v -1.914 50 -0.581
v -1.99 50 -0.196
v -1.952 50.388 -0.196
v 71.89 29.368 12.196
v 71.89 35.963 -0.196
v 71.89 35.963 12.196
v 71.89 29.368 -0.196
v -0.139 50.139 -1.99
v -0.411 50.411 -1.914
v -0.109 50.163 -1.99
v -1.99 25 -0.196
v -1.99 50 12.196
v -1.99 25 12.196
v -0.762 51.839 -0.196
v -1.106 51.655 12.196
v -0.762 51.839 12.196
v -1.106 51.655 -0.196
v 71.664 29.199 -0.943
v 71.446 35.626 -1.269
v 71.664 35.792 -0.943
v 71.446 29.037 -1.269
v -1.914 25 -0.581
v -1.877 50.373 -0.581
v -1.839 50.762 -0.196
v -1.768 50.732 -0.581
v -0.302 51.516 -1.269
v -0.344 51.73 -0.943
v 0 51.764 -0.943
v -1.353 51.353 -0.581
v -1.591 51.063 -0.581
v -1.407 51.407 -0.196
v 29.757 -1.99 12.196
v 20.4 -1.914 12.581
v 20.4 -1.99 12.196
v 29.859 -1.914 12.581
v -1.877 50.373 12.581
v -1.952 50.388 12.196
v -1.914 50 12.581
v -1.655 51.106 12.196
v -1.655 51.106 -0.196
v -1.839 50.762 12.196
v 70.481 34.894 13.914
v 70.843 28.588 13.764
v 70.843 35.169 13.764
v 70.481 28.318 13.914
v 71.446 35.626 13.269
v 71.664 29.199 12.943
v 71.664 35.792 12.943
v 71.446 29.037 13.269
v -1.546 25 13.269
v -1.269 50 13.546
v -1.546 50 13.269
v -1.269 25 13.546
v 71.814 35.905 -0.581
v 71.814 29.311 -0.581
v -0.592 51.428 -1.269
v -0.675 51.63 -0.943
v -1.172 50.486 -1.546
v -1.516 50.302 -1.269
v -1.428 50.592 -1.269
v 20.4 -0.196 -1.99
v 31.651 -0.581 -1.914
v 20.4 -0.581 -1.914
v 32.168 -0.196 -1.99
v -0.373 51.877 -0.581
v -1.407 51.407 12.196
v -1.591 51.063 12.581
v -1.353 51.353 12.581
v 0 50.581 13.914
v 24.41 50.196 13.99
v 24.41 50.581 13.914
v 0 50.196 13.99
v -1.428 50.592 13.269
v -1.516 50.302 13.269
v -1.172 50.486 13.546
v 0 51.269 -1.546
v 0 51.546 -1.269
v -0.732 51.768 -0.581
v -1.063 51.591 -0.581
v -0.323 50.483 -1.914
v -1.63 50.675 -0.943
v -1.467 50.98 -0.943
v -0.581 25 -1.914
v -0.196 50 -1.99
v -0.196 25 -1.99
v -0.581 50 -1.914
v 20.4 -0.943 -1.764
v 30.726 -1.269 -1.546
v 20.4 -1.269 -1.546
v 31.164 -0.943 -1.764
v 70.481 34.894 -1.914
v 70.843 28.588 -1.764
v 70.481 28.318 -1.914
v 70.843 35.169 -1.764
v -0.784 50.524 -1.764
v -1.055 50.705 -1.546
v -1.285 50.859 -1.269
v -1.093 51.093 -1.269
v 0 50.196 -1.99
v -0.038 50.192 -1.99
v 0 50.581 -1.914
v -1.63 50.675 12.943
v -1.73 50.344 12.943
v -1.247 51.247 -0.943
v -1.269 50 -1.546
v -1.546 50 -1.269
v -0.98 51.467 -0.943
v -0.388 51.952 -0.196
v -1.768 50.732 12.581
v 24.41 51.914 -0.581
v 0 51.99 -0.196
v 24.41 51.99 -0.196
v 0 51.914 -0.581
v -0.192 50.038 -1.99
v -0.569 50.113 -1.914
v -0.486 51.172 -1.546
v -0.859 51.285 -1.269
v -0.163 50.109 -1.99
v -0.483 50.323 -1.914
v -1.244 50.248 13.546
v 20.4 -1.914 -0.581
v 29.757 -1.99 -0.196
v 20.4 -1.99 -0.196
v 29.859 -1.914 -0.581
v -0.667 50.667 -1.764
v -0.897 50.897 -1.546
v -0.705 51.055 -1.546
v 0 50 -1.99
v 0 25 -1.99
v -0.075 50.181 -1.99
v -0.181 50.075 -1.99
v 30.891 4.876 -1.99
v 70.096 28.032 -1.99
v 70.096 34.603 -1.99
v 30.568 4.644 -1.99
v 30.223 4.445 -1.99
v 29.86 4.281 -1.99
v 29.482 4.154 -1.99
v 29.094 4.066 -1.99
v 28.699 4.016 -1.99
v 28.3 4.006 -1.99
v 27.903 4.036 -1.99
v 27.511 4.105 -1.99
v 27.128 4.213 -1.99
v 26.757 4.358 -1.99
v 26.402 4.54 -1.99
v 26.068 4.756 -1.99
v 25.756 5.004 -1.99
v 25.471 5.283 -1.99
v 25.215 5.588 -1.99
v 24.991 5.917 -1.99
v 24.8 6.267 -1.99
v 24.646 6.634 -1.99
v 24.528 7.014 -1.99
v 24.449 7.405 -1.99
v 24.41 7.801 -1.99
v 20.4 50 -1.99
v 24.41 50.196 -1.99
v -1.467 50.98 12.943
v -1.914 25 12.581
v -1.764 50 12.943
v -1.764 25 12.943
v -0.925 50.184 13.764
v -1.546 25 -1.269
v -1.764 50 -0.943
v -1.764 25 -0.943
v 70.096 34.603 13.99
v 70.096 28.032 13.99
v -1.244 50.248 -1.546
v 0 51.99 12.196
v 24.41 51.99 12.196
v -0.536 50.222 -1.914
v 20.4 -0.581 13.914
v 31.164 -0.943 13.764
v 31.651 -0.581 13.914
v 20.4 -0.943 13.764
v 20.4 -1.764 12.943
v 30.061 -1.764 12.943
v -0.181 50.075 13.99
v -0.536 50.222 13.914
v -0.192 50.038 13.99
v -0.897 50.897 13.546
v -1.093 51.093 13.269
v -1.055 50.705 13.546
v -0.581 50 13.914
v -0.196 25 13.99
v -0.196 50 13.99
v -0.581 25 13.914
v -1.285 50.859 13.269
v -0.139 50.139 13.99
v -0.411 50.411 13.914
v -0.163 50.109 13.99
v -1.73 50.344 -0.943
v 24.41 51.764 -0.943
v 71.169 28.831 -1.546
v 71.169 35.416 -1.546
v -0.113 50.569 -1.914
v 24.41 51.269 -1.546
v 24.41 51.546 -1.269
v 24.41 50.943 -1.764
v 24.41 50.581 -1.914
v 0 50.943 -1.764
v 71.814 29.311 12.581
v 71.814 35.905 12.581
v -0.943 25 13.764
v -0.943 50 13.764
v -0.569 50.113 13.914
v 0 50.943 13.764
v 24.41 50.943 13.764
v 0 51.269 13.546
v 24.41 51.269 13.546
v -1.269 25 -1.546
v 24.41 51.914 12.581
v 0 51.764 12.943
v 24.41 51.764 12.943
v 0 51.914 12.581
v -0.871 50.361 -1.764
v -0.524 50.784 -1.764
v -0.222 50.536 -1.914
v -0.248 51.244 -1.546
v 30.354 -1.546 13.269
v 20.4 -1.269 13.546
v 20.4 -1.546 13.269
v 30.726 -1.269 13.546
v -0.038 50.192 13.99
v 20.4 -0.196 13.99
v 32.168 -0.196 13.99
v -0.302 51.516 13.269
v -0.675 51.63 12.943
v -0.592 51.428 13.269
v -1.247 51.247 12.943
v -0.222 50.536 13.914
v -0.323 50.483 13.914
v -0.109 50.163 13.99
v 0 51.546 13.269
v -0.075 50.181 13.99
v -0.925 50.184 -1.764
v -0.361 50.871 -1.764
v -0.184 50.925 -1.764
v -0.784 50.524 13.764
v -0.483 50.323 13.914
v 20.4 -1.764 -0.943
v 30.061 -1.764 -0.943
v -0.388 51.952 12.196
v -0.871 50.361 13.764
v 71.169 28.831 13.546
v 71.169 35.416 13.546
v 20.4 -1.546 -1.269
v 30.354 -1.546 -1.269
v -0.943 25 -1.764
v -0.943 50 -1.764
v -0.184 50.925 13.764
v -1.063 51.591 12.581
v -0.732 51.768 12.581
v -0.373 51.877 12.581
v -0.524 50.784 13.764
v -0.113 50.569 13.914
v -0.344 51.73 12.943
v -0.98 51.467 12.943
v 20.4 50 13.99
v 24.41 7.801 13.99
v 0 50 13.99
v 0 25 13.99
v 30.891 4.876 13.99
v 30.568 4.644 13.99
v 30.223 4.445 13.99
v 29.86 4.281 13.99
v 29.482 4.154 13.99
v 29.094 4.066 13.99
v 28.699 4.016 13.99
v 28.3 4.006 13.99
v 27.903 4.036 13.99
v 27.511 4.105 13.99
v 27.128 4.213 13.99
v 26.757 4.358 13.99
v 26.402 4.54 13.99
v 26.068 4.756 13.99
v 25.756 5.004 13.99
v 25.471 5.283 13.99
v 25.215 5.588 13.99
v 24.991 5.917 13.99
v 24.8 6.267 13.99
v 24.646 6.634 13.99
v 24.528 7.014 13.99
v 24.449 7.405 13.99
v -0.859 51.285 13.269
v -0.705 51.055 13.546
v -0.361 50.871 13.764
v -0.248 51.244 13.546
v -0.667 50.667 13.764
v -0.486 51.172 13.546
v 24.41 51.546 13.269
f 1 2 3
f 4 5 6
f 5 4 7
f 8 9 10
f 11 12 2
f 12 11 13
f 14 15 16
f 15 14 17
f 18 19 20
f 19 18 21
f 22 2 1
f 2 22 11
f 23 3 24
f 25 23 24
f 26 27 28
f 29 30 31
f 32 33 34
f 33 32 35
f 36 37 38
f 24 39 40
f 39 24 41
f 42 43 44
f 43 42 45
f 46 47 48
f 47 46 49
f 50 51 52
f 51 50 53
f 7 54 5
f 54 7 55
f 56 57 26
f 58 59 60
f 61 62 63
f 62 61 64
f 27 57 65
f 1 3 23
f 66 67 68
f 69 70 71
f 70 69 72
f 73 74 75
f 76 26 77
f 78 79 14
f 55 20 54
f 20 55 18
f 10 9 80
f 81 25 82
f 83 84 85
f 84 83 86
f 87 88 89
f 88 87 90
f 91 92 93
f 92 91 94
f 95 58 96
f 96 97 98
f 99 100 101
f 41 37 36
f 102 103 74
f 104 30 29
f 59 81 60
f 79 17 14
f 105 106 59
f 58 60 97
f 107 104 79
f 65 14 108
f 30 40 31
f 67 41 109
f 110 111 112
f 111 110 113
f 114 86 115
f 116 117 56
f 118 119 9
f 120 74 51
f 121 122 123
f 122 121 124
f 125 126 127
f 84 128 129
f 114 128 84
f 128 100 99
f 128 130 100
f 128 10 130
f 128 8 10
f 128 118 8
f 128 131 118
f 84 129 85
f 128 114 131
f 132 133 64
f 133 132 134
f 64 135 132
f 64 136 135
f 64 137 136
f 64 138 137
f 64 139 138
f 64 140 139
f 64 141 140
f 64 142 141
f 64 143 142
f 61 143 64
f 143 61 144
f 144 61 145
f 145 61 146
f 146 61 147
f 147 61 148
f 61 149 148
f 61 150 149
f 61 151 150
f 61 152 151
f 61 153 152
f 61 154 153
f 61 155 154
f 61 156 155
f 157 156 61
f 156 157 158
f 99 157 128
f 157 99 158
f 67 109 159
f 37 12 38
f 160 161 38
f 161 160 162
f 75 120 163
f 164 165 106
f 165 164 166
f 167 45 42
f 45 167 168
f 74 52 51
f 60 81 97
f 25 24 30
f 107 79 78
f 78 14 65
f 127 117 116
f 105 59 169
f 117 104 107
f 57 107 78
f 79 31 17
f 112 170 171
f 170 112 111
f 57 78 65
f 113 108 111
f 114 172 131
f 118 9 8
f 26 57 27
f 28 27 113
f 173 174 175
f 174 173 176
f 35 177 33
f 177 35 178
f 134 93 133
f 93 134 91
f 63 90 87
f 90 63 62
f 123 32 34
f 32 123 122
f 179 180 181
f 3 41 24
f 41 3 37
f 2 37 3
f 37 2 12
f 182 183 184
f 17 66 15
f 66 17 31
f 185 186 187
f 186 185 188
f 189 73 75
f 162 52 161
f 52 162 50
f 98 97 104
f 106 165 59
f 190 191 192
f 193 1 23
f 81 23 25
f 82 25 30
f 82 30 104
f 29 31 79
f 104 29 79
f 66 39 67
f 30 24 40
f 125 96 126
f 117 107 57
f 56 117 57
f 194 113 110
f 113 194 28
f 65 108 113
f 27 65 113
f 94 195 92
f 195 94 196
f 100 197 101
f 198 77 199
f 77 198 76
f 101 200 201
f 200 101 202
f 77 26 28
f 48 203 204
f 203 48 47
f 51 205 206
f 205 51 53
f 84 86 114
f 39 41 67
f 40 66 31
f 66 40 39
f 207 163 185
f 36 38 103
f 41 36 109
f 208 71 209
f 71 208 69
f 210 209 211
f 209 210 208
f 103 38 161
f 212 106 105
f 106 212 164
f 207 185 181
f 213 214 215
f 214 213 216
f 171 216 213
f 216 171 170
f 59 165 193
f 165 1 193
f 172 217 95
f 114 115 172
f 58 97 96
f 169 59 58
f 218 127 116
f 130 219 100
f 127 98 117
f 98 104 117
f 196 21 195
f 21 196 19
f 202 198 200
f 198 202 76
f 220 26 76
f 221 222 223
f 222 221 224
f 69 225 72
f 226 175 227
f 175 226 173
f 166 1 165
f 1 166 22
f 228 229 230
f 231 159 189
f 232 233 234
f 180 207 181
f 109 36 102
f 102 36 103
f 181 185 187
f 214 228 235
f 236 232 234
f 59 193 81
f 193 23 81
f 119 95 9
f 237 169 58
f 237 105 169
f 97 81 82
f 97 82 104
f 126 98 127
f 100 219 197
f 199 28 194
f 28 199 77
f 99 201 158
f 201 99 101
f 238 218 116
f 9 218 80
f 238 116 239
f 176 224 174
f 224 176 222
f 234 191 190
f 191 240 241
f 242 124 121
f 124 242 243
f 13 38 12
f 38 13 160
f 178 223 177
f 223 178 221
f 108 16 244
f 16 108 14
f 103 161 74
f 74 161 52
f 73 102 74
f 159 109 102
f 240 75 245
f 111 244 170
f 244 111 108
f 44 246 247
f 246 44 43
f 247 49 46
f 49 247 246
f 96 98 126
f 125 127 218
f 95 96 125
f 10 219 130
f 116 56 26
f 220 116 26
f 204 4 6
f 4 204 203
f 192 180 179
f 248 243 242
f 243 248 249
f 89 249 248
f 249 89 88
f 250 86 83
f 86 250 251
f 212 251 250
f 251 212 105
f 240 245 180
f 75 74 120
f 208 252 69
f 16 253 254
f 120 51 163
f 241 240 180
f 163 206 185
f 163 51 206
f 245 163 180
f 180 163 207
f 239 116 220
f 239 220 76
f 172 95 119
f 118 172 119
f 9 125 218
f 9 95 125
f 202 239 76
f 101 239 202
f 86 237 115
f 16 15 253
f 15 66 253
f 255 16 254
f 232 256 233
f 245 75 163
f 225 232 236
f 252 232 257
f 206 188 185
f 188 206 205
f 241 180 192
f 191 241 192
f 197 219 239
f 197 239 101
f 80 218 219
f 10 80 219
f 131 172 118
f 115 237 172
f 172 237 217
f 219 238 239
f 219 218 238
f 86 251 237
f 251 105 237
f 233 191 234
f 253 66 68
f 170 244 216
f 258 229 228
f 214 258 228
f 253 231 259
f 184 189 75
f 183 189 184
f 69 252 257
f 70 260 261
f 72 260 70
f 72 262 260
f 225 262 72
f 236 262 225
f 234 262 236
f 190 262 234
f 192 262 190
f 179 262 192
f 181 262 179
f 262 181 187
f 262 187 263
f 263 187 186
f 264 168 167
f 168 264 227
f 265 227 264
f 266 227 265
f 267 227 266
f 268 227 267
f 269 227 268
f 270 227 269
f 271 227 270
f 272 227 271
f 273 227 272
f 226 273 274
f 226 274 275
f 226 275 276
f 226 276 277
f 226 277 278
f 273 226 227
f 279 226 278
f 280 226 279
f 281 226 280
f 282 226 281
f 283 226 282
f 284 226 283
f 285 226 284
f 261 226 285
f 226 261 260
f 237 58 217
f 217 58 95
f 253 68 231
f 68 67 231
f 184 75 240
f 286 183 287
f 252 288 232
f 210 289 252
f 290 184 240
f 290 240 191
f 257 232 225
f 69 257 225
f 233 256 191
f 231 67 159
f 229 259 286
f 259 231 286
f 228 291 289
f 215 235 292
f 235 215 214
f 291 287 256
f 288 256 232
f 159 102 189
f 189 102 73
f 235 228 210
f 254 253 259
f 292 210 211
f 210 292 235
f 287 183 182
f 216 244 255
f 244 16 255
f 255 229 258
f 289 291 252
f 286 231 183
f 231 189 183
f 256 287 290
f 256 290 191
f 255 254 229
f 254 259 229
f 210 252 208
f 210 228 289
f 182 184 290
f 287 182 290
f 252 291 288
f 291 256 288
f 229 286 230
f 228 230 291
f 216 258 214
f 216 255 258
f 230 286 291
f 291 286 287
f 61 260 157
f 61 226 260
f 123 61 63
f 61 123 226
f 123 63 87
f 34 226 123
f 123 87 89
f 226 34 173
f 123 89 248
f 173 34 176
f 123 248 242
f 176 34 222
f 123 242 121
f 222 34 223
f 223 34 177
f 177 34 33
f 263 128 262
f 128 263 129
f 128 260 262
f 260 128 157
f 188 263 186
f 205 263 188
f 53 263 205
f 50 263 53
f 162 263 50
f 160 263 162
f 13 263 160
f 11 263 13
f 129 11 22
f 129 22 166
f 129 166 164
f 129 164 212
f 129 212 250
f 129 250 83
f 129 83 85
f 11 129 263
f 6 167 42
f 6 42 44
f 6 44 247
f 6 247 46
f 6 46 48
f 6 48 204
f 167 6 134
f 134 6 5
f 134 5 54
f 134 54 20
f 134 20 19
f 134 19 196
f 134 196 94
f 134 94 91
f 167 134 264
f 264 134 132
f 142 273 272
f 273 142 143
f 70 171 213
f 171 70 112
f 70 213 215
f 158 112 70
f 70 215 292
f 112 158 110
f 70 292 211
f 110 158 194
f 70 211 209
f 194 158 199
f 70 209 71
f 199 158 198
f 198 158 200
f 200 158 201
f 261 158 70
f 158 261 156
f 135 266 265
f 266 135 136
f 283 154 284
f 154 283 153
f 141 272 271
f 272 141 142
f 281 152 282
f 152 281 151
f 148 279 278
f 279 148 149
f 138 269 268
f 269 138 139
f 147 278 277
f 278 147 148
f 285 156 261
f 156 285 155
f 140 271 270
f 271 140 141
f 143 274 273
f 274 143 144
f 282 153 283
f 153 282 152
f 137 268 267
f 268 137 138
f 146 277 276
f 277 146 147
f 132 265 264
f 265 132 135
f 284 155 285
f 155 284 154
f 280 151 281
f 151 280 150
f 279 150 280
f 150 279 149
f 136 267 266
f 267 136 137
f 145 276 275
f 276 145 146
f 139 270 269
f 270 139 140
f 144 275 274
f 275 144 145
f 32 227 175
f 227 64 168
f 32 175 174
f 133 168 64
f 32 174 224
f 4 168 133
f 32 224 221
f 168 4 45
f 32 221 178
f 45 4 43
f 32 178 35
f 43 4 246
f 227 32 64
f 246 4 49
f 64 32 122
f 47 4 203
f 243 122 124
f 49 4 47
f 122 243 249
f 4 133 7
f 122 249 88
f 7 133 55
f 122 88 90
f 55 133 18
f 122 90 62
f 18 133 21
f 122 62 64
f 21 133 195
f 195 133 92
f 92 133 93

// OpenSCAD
/*
Creator
*****************
Constantin Ganshin


Project name:
*****************
hook


Description:
****************************************
Hook for hanging stuff on the windoe rails on the service balcony

Sketch:
****************************************
            c            
            -----                 |
            |   |               |
          a |   | b           |   d
            |   |           |
            |   |         |
                |       |
                |     |
                |   |
                | |
                 V   
                
Notes:
****************************************

*/

// Resolution variables
$fa = 1;
$fs = 0.4;

// Main dimension variables (part name is marked on the sketch)
a = 25;
b = 50;
c = 20.4; //For the locker at work, 11.5 - for the service balcony Inside measurements
d = 70;
angle_b_d = 45;
sphere_r = 2;
cube_x = c + 49.5 ; //c^2 = a^2 + b^2 - 2ab \cdot \cos(C)
cube_y = b;
cube_z = 14 - sphere_r; 

// Modules
module hook(){
  difference(){
    minkowski(){
      cube([cube_x, cube_y, cube_z]); // Base cube
      sphere(sphere_r); // Corners radius (will enlarge the module by this)
    }
    translate([0, - sphere_r - 1, - sphere_r -1])
      cube([c, b + (sphere_r) + 1, cube_z + (sphere_r * 2) + 2]);

    translate([- sphere_r - 1, - sphere_r - 1, - sphere_r -1])
      cube([sphere_r + 2, b - a  + sphere_r + 1, cube_z + (sphere_r * 2) + 2]);
    
    // Inside triangle
    minkowski(){
      translate([(sphere_r) + c + 6, sphere_r + 6, - sphere_r - 1])
        linear_extrude(cube_z + (sphere_r * 2) + 2)
        polygon(points=[[0, 0], [0, b + sphere_r + 1], [cube_x, b + sphere_r + 1]]);
      sphere(sphere_r + 2);
    }
    
    // Outside triangle (on the right side)
    translate([(sphere_r * 2) + c + 8, - sphere_r - 1, - sphere_r - 1])
      linear_extrude(cube_z + (sphere_r * 2) + 2)
      polygon(points=[[- sphere_r * 2, 0], [cube_x, (sphere_r * 2) + b + 1], [cube_x + sphere_r + 1, -sphere_r - 1]]);
  }
}

// 3D module generation
hook();
